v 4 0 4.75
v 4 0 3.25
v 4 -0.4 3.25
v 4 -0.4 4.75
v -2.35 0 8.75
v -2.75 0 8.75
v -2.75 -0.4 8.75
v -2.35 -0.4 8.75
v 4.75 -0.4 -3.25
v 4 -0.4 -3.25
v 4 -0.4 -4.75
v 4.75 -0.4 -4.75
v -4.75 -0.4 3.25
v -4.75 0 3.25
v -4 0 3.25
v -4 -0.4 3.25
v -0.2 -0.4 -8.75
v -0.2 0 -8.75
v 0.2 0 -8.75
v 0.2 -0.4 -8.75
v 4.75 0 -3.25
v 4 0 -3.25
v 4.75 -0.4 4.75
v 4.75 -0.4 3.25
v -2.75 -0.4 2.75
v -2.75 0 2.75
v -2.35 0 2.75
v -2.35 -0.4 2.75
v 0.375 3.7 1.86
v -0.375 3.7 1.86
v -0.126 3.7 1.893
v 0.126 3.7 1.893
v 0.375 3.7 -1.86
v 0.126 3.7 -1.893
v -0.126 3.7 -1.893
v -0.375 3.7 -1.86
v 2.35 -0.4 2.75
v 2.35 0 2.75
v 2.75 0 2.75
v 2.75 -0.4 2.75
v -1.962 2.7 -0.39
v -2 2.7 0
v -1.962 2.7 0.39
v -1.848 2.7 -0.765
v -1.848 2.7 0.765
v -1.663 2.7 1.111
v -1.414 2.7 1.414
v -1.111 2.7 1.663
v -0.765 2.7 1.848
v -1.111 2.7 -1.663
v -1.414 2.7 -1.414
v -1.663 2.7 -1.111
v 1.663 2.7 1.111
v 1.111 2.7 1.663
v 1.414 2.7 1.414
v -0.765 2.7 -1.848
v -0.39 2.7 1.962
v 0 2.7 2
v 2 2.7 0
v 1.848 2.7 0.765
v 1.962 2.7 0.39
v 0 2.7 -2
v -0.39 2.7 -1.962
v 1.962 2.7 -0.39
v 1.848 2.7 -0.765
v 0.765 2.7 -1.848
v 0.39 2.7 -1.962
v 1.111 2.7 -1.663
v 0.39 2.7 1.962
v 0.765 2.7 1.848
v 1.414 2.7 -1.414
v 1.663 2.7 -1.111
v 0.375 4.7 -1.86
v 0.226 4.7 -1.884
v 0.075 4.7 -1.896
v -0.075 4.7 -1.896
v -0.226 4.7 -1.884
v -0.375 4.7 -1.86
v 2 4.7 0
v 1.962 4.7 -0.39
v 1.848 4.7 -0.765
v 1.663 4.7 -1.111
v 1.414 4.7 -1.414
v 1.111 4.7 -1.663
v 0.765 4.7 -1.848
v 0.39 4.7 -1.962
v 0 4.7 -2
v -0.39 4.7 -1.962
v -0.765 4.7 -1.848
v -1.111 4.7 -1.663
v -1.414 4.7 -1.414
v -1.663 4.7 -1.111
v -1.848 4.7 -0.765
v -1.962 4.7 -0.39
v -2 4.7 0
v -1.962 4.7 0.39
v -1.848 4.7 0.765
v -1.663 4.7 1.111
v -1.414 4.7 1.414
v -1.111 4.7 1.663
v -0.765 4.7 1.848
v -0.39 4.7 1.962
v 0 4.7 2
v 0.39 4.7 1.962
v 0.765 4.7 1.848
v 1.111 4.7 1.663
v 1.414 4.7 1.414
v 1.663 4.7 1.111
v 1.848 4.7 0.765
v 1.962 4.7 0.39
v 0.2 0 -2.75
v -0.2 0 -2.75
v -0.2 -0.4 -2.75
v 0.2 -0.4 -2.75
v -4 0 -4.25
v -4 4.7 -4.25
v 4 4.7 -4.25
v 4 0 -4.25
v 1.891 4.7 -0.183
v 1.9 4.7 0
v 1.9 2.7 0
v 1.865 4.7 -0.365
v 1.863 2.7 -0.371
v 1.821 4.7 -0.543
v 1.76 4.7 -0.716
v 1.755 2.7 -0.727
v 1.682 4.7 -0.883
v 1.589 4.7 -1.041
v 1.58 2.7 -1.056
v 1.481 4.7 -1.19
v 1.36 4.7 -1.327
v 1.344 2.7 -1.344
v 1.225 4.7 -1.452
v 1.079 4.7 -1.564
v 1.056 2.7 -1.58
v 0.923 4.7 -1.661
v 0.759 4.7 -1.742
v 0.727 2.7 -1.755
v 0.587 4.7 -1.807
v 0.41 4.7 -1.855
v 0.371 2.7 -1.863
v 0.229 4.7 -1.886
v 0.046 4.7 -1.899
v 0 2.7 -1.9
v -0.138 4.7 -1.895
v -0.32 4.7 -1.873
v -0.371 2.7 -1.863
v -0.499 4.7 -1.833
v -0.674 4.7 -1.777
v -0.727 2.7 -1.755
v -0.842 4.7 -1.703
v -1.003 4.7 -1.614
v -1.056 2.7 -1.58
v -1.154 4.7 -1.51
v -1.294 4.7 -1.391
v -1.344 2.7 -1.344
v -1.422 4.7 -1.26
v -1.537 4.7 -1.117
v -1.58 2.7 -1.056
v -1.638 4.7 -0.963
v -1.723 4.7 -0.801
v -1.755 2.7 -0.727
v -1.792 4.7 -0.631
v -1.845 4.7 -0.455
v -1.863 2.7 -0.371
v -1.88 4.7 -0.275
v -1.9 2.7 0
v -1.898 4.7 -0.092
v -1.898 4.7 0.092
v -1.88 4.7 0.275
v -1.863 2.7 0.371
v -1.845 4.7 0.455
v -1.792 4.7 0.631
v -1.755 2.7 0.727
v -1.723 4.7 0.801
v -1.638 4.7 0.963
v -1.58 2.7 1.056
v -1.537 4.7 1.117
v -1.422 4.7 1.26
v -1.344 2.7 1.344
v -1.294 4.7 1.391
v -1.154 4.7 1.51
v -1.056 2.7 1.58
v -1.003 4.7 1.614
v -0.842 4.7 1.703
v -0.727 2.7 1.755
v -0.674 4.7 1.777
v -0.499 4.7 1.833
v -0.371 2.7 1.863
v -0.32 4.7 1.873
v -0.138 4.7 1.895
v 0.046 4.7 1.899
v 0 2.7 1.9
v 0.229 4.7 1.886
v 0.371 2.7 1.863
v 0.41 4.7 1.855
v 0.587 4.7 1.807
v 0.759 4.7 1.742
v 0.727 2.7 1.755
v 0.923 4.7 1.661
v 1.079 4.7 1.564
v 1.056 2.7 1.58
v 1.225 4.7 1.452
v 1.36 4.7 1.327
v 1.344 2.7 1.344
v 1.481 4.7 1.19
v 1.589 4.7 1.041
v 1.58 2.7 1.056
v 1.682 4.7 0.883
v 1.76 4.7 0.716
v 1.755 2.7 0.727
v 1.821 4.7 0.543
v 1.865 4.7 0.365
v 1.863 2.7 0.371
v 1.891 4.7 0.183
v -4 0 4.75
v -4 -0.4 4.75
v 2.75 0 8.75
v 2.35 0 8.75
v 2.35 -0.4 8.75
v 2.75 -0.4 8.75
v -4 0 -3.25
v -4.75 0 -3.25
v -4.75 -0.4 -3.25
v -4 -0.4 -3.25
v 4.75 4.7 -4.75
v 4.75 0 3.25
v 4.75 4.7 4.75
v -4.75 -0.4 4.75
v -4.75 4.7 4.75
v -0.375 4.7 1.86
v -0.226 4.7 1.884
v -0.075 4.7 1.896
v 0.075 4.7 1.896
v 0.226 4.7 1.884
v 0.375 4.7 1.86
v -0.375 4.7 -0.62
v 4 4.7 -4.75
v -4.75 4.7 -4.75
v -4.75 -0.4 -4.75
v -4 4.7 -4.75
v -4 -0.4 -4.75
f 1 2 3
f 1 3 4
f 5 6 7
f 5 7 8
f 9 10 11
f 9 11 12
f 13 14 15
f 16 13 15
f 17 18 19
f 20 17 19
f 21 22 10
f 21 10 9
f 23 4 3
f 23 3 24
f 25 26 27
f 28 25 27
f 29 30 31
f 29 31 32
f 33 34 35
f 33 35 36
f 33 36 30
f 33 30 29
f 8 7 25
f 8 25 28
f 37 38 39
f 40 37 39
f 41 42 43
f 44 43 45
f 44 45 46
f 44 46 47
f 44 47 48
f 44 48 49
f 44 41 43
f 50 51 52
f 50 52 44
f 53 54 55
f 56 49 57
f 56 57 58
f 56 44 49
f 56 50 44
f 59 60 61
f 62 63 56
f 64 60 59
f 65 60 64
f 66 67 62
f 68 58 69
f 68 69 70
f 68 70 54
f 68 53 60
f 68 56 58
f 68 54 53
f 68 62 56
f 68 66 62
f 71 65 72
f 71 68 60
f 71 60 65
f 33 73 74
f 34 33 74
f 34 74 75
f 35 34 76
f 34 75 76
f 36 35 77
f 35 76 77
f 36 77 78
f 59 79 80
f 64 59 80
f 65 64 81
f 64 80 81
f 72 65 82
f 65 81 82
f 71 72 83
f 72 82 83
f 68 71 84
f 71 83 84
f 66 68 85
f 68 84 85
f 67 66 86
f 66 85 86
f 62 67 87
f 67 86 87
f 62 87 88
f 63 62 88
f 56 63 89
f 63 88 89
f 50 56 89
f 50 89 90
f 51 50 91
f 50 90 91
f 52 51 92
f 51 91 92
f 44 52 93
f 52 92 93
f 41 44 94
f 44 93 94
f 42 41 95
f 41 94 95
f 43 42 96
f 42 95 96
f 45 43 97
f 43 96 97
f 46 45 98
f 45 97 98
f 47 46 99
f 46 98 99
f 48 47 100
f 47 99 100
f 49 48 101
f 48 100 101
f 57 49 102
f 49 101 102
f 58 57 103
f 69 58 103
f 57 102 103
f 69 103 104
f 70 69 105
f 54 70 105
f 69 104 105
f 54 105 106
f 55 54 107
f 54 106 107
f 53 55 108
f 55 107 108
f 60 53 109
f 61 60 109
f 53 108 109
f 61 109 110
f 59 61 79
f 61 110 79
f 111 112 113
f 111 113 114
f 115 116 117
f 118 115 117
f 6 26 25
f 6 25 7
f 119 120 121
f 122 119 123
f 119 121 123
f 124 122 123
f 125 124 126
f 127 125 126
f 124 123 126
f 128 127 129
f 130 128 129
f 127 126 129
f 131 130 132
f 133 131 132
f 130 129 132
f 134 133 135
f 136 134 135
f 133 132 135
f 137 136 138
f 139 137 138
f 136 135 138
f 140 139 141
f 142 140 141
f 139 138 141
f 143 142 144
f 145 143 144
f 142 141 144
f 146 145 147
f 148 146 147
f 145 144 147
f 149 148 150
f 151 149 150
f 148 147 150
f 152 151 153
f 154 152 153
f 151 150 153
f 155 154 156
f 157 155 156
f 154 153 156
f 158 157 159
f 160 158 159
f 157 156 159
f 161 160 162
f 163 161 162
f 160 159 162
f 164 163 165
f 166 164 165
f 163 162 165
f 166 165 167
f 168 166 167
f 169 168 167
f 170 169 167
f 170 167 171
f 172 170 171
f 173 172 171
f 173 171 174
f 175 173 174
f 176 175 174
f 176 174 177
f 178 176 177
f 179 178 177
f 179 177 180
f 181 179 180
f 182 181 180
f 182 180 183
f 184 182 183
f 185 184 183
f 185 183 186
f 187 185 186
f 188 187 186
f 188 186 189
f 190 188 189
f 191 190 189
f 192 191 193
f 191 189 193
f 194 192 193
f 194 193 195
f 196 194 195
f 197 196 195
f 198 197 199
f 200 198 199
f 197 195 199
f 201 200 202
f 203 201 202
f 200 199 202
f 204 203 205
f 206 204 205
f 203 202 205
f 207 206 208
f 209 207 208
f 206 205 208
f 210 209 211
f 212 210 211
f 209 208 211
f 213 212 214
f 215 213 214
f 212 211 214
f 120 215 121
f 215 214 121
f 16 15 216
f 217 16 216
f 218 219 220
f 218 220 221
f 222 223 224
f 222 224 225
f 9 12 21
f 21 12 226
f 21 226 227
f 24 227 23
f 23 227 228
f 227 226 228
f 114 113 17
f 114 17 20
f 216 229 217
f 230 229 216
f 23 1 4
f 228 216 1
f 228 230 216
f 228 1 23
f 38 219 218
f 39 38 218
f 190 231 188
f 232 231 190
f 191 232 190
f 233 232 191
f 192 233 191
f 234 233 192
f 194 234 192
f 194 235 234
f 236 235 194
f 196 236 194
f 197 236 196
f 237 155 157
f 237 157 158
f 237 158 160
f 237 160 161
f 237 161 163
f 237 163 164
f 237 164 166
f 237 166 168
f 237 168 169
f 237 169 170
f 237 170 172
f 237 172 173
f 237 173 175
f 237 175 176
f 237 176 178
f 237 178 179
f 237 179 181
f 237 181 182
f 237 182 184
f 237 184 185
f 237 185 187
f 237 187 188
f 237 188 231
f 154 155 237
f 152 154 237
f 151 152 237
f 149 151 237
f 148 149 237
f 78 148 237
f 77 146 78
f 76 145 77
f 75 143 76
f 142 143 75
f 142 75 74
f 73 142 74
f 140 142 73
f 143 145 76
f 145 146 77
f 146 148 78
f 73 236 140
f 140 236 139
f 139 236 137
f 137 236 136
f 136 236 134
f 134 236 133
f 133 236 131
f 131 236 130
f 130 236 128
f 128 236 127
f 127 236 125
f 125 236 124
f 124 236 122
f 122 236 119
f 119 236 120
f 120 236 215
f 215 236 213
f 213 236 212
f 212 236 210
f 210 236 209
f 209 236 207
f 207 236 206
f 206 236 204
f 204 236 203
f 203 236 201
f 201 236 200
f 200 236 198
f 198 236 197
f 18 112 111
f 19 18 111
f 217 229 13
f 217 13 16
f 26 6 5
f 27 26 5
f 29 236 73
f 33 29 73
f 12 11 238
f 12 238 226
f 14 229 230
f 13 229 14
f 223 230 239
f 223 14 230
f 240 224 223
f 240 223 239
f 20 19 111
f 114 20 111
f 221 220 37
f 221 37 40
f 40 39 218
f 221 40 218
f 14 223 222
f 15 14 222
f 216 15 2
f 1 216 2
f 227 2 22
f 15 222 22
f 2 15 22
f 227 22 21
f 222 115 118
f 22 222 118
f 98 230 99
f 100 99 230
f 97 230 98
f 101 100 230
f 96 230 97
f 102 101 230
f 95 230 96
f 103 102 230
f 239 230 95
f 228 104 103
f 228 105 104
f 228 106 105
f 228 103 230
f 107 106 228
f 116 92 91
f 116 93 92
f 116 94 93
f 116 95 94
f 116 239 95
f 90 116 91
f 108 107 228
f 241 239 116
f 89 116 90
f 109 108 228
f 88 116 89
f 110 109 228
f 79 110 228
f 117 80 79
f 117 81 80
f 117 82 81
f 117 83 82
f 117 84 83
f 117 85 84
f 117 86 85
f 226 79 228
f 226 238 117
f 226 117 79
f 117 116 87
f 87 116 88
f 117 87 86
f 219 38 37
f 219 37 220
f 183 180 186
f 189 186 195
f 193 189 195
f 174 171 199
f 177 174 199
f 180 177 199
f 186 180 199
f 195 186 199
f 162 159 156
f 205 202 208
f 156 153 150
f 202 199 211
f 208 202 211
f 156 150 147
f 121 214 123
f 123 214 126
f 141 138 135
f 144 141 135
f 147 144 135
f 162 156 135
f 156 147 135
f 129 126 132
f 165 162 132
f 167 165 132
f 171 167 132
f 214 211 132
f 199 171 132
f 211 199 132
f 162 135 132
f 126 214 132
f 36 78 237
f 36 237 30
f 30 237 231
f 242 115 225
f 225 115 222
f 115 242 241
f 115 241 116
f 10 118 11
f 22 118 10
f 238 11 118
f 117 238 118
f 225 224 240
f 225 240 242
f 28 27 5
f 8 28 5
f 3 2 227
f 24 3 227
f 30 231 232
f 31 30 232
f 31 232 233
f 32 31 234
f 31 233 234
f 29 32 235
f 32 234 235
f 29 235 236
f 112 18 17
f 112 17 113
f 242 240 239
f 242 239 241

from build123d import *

# Parameters (mm, degrees)
SKETCH1_W               = 9.5
SKETCH1_H               = 9.5
BOSS_EXTRUDE1_DEPTH     = 4.7
SKETCH2_W               = 0.75
SKETCH2_H               = 1.5
BOSS_EXTRUDE2_DEPTH     = 0.4
SKETCH3_W               = 0.4
SKETCH3_H               = 6
BOSS_EXTRUDE3_DEPTH     = 0.4
BOSS_EXTRUDE3_2_DEPTH   = 0.4
BOSS_EXTRUDE3_3_DEPTH   = 0.4
SKETCH4_W               = 8
SKETCH4_H               = 0.5
CUT_EXTRUDE1_DEPTH      = 4.7
SKETCH5_R               = 2
CUT_EXTRUDE2_DEPTH      = 1
CUT_EXTRUDE2_DEPTH_BACK = 2
SKETCH6_R               = 1.9
BOSS_EXTRUDE4_DEPTH     = 2
CUT_EXTRUDE3_DEPTH      = 1


with BuildPart() as part:
    # Sketch1 → Boss-Extrude1 (new body)
    with BuildSketch(Plane(origin=(0, 0, 0), x_dir=(1, 0, 0), z_dir=(0, 1, 0))):
        Rectangle(SKETCH1_W, SKETCH1_H)
    extrude(amount=BOSS_EXTRUDE1_DEPTH)

    # Sketch2 → Boss-Extrude2 (add)
    with BuildSketch(Plane.XZ):
        with Locations((4.375, 4)):
            Rectangle(SKETCH2_W, SKETCH2_H)
        with Locations((-4.375, 4)):
            Rectangle(SKETCH2_W, SKETCH2_H)
        with Locations((4.375, -4)):
            Rectangle(SKETCH2_W, SKETCH2_H)
        with Locations((-4.375, -4)):
            Rectangle(SKETCH2_W, SKETCH2_H)
    extrude(amount=BOSS_EXTRUDE2_DEPTH)

    # Sketch4 → Cut-Extrude1 (cut)
    with BuildSketch(Plane(origin=(0, 4.7, 0), x_dir=(1, 0, 0), z_dir=(0, 1, 0))):
        with Locations((0, 4.5)):
            Rectangle(SKETCH4_W, SKETCH4_H)
    extrude(amount=-CUT_EXTRUDE1_DEPTH, mode=Mode.SUBTRACT)

    # Sketch5 → Cut-Extrude2 (cut, two sides)
    with BuildSketch(Plane(origin=(0, 4.7, 0), x_dir=(1, 0, 0), z_dir=(0, 1, 0))) as cut_extrude2_sk:
        Circle(SKETCH5_R)
    extrude(amount=CUT_EXTRUDE2_DEPTH, mode=Mode.SUBTRACT)
    extrude(cut_extrude2_sk.sketch, amount=-CUT_EXTRUDE2_DEPTH_BACK, mode=Mode.SUBTRACT)


with BuildPart() as body_2:
    # Sketch3 → Boss-Extrude3 (new body)
    with BuildSketch(Plane.XZ):
        with Locations((2.55, 5.75)):
            Rectangle(SKETCH3_W, SKETCH3_H)
    extrude(amount=BOSS_EXTRUDE3_DEPTH)


with BuildPart() as body_3:
    # Sketch3 → Boss-Extrude3 2 (new body)
    with BuildSketch(Plane.XZ):
        with Locations((0, -5.75)):
            Rectangle(SKETCH3_W, SKETCH3_H)
    extrude(amount=BOSS_EXTRUDE3_2_DEPTH)


with BuildPart() as body_4:
    # Sketch3 → Boss-Extrude3 3 (new body)
    with BuildSketch(Plane.XZ):
        with Locations((-2.55, 5.75)):
            Rectangle(SKETCH3_W, SKETCH3_H)
    extrude(amount=BOSS_EXTRUDE3_3_DEPTH)


with BuildPart() as body_5:
    # Sketch6 → Boss-Extrude4 (new body)
    with BuildSketch(Plane(origin=(0, 2.7, 0), x_dir=(1, 0, 0), z_dir=(0, 1, 0))):
        Circle(SKETCH6_R)
    extrude(amount=BOSS_EXTRUDE4_DEPTH)

    # Sketch7 → Cut-Extrude3 (cut)
    with BuildSketch(Plane(origin=(0, 4.7, 0), x_dir=(1, 0, 0), z_dir=(0, 1, 0))):
        with BuildLine():
            Line((0.375, -1.859794894), (0.375, 1.859794894))
            ThreePointArc((0.375, 1.859794894), (0, 1.897224828), (-0.375, 1.859794894))
            Line((-0.375, 1.859794894), (-0.375, -1.859794894))
            ThreePointArc((-0.375, -1.859794894), (0, -1.897224828), (0.375, -1.859794894))
        make_face()
    extrude(amount=-CUT_EXTRUDE3_DEPTH, mode=Mode.SUBTRACT)


solid = Compound([part.part, body_2.part, body_3.part, body_4.part, body_5.part])
